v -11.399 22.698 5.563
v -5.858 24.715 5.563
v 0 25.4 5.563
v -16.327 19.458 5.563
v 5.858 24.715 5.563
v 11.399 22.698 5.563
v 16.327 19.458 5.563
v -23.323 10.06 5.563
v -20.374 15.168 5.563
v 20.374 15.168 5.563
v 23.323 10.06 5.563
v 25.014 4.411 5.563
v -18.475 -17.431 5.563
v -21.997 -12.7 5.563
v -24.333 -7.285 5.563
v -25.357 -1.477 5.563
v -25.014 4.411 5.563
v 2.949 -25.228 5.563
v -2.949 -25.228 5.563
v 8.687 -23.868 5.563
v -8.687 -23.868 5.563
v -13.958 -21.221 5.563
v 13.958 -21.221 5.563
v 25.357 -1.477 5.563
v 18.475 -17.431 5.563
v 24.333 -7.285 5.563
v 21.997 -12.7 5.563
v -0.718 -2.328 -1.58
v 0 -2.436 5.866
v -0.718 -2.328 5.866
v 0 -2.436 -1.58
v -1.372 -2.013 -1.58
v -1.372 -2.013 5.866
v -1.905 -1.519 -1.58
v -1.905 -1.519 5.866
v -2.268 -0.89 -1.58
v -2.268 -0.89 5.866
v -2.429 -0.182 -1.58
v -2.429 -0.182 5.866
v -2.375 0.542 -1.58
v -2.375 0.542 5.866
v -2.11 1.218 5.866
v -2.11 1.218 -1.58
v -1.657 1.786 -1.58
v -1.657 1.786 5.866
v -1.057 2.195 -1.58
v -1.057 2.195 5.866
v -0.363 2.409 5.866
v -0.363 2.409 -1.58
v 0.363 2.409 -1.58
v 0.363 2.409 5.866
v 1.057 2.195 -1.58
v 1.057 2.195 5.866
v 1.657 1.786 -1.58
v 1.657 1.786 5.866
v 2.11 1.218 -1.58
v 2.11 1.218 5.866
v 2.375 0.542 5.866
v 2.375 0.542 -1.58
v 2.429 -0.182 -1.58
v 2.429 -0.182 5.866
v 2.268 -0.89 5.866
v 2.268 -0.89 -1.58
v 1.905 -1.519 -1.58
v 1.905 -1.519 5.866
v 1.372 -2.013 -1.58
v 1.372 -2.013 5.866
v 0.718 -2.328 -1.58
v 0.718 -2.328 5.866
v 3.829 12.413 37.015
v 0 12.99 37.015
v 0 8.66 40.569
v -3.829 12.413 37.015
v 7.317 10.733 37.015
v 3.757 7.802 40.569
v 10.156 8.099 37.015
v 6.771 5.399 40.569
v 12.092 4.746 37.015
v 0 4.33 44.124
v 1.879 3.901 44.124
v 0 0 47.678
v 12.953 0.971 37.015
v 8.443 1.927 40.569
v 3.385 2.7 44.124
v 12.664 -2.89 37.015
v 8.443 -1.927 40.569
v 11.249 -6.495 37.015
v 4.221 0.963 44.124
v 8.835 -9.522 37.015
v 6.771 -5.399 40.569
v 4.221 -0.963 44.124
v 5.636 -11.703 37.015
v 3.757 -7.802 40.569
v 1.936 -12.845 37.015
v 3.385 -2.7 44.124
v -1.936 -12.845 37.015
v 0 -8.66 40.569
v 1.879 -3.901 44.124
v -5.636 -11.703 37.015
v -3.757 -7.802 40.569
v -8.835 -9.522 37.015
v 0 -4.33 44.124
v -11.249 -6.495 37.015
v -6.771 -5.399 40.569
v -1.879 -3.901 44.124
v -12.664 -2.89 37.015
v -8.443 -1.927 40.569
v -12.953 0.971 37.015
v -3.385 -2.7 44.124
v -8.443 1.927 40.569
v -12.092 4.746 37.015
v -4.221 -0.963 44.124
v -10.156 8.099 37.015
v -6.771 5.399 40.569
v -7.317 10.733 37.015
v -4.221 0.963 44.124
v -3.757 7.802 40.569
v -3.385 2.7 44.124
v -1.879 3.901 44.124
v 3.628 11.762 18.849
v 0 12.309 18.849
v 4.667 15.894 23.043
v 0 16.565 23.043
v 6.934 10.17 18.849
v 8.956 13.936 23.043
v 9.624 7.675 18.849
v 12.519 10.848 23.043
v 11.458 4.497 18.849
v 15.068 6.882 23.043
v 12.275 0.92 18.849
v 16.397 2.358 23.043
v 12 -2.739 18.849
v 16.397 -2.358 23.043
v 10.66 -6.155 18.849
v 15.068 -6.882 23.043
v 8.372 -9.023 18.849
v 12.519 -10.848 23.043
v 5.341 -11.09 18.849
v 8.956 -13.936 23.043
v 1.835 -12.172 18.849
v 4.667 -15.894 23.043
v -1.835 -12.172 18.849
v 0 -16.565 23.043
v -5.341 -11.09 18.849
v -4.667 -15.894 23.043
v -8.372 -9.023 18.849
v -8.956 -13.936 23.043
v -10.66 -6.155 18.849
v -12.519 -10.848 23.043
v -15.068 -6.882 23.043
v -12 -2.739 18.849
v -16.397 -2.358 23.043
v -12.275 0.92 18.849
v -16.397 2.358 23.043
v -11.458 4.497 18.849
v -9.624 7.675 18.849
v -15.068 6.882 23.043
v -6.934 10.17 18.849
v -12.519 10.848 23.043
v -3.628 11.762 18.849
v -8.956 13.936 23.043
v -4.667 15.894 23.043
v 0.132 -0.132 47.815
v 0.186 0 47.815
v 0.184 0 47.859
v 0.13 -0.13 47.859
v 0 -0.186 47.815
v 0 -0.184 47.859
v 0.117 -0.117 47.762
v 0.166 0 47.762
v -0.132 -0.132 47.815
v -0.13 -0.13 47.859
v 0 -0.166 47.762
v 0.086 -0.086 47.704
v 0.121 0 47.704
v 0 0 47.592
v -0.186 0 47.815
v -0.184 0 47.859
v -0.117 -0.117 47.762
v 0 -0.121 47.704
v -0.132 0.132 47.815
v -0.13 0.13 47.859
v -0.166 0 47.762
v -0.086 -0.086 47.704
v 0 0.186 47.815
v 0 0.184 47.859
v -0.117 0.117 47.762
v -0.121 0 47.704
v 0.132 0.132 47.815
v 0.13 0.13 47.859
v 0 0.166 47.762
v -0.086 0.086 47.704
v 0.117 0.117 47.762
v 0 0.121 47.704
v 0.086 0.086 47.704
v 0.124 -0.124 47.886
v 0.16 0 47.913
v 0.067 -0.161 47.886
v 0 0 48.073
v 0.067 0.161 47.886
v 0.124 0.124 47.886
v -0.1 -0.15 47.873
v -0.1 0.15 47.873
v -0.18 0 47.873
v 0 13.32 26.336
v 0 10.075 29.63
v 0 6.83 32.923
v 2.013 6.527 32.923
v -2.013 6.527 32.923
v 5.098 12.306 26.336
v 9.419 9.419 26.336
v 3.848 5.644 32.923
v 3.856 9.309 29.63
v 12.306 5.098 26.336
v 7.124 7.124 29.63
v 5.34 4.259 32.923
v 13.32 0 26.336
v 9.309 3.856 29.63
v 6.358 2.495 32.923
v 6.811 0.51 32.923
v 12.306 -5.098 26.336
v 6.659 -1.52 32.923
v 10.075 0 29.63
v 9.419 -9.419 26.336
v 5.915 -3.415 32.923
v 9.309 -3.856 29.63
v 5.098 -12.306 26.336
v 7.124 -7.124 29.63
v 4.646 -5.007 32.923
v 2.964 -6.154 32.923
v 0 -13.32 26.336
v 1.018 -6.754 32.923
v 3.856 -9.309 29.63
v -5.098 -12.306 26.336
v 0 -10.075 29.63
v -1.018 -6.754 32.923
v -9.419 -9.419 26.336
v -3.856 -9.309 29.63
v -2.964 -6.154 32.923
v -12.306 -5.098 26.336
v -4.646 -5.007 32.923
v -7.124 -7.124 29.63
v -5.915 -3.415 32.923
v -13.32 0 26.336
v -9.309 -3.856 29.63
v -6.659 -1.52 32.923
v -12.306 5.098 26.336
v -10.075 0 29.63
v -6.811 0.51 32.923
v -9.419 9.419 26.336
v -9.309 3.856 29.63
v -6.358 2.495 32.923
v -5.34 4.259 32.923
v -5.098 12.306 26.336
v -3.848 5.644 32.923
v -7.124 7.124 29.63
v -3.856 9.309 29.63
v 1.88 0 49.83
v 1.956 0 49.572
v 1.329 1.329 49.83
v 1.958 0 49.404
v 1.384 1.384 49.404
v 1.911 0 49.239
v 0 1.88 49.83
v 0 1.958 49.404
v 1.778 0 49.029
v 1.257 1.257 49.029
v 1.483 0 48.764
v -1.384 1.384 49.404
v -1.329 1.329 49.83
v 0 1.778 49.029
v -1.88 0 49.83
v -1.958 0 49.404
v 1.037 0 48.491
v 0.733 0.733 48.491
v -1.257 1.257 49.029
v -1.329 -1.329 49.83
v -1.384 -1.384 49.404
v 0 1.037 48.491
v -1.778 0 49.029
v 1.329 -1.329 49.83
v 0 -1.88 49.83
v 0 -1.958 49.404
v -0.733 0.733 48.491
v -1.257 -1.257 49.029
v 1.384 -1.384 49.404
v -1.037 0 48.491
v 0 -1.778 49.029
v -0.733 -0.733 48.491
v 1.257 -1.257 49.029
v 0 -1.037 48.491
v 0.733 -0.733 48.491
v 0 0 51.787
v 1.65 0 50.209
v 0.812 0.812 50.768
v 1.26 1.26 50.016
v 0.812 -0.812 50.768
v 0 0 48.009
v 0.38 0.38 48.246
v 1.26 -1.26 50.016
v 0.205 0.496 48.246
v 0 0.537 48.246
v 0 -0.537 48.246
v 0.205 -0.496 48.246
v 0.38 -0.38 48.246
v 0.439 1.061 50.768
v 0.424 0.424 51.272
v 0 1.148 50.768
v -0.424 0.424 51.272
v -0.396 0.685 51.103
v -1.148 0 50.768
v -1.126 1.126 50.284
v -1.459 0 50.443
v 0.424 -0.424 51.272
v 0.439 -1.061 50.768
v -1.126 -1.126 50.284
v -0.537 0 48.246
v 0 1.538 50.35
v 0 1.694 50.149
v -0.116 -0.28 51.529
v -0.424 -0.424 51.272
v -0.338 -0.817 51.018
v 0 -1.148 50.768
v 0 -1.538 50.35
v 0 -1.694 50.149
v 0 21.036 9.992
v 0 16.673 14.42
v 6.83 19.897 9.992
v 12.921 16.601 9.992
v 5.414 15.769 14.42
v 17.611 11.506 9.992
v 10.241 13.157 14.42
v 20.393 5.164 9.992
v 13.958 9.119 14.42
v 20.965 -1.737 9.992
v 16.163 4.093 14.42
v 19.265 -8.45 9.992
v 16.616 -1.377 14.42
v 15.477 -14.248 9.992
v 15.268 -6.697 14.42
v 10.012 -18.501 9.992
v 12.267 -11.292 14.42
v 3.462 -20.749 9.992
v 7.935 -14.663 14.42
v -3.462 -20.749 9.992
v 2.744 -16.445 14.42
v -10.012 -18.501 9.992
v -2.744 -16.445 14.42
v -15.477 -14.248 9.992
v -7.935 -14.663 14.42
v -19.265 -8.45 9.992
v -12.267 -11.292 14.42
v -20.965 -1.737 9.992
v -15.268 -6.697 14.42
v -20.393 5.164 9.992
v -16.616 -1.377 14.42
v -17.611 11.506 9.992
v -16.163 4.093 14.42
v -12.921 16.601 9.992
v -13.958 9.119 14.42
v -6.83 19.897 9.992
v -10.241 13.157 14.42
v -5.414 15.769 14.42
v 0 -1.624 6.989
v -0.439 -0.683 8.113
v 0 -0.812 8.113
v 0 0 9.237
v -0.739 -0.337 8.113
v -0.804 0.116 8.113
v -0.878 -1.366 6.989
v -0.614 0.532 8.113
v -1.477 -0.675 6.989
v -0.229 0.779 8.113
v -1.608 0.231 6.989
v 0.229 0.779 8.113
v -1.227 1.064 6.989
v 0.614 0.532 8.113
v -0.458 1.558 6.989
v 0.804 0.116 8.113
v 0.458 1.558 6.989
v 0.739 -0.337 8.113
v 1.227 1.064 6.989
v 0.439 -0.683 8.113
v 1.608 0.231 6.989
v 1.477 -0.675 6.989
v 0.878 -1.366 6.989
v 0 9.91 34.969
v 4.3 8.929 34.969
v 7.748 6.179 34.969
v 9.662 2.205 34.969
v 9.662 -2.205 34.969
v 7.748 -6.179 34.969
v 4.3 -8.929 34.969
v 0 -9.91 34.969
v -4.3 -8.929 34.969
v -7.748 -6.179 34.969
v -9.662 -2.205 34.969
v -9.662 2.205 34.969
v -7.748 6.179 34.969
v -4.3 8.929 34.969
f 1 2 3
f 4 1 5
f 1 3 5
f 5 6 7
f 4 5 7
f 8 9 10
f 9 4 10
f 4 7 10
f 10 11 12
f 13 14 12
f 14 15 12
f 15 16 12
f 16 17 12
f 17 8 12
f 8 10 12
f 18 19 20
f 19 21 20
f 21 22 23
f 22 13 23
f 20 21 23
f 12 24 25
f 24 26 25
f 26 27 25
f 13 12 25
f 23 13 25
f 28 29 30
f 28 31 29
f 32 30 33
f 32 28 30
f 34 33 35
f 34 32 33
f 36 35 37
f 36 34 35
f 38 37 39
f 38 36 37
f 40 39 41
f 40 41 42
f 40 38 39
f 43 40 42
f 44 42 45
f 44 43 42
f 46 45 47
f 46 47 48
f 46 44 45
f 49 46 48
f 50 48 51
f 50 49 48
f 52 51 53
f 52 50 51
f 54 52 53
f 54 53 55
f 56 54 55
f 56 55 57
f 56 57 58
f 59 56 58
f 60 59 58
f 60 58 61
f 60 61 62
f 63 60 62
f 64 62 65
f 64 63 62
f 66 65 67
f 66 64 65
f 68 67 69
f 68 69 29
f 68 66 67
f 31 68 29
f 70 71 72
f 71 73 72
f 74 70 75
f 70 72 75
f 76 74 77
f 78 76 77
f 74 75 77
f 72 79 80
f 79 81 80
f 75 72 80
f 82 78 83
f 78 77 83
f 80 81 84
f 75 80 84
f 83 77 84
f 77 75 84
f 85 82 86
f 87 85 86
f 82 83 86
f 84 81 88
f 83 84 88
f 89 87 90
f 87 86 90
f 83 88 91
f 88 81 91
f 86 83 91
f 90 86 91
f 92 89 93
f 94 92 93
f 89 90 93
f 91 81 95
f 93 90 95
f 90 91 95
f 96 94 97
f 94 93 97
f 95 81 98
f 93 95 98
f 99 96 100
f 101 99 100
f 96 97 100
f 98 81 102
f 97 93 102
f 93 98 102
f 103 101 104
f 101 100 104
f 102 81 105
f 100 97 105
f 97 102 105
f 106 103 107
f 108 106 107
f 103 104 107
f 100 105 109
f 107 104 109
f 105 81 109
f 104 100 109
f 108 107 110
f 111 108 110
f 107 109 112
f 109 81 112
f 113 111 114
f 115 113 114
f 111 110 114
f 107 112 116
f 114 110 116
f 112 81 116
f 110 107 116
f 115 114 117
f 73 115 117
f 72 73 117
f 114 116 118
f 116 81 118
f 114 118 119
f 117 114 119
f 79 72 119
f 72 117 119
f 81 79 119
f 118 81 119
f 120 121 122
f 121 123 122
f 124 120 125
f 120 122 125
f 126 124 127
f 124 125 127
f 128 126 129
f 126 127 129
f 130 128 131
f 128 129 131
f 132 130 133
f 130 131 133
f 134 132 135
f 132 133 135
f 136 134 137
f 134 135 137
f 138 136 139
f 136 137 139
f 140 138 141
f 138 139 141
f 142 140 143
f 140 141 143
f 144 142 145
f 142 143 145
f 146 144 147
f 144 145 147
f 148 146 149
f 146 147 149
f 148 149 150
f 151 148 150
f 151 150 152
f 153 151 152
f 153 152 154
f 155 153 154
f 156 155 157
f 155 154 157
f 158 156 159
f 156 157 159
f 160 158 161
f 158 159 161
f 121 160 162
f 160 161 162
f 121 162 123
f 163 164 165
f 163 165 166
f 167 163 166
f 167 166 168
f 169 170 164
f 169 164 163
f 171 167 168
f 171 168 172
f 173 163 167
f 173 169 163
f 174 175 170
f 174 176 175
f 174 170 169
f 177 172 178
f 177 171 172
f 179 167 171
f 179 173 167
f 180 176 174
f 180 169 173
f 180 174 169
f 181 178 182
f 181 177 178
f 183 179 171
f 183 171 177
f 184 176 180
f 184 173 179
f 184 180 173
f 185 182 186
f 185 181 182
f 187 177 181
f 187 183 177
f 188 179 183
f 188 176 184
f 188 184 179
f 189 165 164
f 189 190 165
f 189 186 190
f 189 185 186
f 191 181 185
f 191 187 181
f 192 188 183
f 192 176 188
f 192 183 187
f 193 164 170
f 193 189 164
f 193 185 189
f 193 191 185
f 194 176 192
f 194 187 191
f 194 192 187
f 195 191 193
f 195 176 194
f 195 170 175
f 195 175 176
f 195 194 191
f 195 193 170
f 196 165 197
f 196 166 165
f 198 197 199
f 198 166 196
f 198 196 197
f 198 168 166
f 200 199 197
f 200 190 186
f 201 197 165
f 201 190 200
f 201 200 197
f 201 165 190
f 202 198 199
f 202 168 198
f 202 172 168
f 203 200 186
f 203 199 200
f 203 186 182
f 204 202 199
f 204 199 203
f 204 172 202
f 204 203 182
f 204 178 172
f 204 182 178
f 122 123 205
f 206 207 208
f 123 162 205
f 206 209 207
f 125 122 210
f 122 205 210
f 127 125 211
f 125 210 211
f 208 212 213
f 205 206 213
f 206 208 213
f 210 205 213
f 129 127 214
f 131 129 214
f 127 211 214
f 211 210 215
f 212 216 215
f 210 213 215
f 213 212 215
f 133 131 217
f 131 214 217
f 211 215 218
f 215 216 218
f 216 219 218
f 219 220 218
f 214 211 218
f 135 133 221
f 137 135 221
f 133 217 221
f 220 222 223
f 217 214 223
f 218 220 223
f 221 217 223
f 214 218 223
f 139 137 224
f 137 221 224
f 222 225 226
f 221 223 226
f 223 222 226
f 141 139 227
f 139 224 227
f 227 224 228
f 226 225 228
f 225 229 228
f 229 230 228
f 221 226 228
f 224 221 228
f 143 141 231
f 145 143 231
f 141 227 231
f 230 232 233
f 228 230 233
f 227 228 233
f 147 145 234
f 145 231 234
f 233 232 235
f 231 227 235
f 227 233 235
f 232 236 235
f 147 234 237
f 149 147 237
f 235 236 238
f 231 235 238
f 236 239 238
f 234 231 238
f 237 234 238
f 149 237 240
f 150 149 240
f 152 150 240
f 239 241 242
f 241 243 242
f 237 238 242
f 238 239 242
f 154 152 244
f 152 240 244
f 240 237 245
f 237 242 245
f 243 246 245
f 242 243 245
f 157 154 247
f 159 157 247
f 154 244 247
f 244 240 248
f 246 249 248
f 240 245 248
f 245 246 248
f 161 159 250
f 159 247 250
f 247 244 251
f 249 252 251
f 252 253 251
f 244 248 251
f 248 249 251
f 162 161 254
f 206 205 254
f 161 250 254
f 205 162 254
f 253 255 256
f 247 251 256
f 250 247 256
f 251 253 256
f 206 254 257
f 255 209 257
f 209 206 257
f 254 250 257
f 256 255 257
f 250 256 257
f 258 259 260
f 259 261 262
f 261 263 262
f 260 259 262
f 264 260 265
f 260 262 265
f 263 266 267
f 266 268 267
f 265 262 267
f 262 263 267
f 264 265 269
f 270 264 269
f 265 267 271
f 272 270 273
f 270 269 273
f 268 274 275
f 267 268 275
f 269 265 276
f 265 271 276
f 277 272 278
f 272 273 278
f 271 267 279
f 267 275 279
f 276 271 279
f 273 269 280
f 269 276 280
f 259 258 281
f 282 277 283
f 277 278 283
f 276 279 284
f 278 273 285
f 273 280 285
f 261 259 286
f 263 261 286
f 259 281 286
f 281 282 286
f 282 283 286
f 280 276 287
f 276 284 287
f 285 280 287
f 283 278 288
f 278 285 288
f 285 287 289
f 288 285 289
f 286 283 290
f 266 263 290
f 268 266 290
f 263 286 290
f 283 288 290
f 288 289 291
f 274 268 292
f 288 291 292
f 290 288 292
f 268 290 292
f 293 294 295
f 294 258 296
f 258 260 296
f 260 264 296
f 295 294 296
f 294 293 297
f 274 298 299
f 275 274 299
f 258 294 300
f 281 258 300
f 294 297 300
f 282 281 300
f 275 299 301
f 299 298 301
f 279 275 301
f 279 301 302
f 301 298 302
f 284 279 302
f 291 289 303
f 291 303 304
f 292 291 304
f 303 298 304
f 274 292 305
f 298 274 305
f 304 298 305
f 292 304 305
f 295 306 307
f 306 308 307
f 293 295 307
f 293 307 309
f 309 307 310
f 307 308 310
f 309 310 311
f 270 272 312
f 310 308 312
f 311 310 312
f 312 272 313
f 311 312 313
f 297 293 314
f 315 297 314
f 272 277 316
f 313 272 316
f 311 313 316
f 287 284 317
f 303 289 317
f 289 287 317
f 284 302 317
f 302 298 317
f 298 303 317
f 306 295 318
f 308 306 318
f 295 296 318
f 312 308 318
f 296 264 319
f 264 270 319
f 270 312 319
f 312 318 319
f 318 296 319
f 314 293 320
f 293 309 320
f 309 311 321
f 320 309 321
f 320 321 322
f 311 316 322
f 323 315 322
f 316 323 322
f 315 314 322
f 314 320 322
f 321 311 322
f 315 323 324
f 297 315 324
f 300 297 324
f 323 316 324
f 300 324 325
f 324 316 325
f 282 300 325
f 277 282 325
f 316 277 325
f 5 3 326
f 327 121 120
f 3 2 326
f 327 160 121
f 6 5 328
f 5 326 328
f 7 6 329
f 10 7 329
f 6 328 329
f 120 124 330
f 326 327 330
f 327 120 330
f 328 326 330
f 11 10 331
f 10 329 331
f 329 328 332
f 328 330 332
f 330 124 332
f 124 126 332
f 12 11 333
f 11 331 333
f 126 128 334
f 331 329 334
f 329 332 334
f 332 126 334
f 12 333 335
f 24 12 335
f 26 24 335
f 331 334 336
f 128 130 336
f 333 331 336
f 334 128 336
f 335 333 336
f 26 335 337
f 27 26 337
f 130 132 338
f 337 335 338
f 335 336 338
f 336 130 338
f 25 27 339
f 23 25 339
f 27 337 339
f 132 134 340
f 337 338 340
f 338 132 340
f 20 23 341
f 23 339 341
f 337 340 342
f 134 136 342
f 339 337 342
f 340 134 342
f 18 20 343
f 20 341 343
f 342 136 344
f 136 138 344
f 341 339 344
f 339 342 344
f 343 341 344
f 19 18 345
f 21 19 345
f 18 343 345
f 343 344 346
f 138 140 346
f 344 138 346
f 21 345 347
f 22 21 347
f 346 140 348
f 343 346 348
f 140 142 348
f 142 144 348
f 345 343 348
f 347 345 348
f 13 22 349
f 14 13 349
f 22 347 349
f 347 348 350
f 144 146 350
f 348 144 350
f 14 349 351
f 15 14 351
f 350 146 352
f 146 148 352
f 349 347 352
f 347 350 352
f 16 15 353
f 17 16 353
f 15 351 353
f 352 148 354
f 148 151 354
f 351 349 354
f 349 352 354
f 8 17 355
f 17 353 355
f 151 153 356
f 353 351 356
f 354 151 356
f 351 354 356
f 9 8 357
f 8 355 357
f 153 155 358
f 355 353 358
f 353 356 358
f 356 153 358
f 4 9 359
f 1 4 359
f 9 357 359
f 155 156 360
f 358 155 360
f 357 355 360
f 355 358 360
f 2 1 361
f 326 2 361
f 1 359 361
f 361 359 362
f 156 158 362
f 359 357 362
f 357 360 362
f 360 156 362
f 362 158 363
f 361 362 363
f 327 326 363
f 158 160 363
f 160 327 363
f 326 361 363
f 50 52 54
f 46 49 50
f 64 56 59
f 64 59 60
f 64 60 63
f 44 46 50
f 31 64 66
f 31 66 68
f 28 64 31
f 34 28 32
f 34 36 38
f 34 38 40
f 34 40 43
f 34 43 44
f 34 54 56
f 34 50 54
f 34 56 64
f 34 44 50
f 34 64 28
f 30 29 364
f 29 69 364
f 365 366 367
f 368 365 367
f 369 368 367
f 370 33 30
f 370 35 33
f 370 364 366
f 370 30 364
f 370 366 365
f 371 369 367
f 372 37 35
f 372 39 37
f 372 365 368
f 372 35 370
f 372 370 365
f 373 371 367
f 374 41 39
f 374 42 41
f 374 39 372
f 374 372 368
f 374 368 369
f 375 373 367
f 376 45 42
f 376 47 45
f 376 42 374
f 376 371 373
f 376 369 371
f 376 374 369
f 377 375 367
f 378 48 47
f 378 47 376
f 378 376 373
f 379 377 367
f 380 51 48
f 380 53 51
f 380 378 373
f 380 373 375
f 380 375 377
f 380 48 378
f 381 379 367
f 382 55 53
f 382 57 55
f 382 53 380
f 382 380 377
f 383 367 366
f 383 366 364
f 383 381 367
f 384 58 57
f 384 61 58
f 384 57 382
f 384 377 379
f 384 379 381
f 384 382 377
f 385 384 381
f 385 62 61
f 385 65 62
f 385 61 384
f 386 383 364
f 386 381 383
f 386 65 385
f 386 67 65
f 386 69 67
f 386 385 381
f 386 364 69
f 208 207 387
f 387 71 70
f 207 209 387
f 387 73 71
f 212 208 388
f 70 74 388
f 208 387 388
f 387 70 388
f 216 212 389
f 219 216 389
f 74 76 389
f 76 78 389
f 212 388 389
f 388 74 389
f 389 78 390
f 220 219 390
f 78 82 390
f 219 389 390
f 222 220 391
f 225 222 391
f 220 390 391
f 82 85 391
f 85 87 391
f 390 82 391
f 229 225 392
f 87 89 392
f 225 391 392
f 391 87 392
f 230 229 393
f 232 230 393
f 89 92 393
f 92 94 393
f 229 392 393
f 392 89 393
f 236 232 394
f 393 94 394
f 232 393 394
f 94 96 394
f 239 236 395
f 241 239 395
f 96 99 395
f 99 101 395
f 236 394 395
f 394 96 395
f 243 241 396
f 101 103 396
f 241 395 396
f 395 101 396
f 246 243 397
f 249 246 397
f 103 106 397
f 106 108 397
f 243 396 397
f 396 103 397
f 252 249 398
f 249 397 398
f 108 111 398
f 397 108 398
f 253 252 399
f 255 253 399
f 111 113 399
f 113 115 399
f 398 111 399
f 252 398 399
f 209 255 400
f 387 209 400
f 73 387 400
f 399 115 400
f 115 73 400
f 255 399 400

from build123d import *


with BuildPart() as f1:
    # F0 (on Right) → F1 (revolve)
    with BuildSketch(Plane.YZ):
        Polygon((12.9897355498, 37.0151433533), (0, 47.6779532356), (0, 5.5629422697), (25.4, 5.5629422697), (12.3090927451, 18.8490473593), (16.5654007445, 23.042822201), (6.8304821963, 32.9228976115), align=None)
    revolve(axis=Axis((0, 0, 26.6204477526), (0, 0, -1)))


with BuildPart() as f3:
    # F2 (on Front) → F3 (revolve)
    with BuildSketch(Plane.XZ):
        with BuildLine():
            Line((0, 51.7865270376), (0, 48.0089448392))
            add(Edge.make_bspline(
                [(0, 51.7865270376), (1.0221085545, 50.9204450995), (2.9462522711, 49.2900252073), (0.9403591418, 48.4178289145), (0, 48.0089448392)],
                knots=[0, 0, 0, 0, 0.5312017734, 1, 1, 1, 1], degree=3))
        make_face()
    revolve(axis=Axis((0, 0, 49.8977359384), (0, 0, 1)))


with BuildPart() as f5:
    # F4 (on Front) → F5 (revolve)
    with BuildSketch(Plane.XZ):
        with BuildLine():
            add(Edge.make_bspline(
                [(0, 48.072591424), (0.0938272351, 47.9925678422), (0.2814817053, 47.8325206786), (0.0938272351, 47.6724735151), (0, 47.5924499333)],
                knots=[0, 0, 0, 0, 0.5, 1, 1, 1, 1], degree=3))
            Line((0, 48.072591424), (0, 47.5924499333))
        make_face()
    revolve(axis=Axis((0, 0, 47.8325206786), (0, 0, -1)))


with BuildPart() as f7:
    # F6 (on Right) → F7 (revolve)
    with BuildSketch(Plane.YZ):
        Polygon((0, -1.5797003871), (0, 9.2366635799), (-2.436122275, 5.8656565379), (-2.436122275, -1.5797003871), align=None)
    revolve(axis=Axis((0, 0, 3.8284815964), (0, 0, -1)))


solid = Compound([f1.part, f3.part, f5.part, f7.part])
